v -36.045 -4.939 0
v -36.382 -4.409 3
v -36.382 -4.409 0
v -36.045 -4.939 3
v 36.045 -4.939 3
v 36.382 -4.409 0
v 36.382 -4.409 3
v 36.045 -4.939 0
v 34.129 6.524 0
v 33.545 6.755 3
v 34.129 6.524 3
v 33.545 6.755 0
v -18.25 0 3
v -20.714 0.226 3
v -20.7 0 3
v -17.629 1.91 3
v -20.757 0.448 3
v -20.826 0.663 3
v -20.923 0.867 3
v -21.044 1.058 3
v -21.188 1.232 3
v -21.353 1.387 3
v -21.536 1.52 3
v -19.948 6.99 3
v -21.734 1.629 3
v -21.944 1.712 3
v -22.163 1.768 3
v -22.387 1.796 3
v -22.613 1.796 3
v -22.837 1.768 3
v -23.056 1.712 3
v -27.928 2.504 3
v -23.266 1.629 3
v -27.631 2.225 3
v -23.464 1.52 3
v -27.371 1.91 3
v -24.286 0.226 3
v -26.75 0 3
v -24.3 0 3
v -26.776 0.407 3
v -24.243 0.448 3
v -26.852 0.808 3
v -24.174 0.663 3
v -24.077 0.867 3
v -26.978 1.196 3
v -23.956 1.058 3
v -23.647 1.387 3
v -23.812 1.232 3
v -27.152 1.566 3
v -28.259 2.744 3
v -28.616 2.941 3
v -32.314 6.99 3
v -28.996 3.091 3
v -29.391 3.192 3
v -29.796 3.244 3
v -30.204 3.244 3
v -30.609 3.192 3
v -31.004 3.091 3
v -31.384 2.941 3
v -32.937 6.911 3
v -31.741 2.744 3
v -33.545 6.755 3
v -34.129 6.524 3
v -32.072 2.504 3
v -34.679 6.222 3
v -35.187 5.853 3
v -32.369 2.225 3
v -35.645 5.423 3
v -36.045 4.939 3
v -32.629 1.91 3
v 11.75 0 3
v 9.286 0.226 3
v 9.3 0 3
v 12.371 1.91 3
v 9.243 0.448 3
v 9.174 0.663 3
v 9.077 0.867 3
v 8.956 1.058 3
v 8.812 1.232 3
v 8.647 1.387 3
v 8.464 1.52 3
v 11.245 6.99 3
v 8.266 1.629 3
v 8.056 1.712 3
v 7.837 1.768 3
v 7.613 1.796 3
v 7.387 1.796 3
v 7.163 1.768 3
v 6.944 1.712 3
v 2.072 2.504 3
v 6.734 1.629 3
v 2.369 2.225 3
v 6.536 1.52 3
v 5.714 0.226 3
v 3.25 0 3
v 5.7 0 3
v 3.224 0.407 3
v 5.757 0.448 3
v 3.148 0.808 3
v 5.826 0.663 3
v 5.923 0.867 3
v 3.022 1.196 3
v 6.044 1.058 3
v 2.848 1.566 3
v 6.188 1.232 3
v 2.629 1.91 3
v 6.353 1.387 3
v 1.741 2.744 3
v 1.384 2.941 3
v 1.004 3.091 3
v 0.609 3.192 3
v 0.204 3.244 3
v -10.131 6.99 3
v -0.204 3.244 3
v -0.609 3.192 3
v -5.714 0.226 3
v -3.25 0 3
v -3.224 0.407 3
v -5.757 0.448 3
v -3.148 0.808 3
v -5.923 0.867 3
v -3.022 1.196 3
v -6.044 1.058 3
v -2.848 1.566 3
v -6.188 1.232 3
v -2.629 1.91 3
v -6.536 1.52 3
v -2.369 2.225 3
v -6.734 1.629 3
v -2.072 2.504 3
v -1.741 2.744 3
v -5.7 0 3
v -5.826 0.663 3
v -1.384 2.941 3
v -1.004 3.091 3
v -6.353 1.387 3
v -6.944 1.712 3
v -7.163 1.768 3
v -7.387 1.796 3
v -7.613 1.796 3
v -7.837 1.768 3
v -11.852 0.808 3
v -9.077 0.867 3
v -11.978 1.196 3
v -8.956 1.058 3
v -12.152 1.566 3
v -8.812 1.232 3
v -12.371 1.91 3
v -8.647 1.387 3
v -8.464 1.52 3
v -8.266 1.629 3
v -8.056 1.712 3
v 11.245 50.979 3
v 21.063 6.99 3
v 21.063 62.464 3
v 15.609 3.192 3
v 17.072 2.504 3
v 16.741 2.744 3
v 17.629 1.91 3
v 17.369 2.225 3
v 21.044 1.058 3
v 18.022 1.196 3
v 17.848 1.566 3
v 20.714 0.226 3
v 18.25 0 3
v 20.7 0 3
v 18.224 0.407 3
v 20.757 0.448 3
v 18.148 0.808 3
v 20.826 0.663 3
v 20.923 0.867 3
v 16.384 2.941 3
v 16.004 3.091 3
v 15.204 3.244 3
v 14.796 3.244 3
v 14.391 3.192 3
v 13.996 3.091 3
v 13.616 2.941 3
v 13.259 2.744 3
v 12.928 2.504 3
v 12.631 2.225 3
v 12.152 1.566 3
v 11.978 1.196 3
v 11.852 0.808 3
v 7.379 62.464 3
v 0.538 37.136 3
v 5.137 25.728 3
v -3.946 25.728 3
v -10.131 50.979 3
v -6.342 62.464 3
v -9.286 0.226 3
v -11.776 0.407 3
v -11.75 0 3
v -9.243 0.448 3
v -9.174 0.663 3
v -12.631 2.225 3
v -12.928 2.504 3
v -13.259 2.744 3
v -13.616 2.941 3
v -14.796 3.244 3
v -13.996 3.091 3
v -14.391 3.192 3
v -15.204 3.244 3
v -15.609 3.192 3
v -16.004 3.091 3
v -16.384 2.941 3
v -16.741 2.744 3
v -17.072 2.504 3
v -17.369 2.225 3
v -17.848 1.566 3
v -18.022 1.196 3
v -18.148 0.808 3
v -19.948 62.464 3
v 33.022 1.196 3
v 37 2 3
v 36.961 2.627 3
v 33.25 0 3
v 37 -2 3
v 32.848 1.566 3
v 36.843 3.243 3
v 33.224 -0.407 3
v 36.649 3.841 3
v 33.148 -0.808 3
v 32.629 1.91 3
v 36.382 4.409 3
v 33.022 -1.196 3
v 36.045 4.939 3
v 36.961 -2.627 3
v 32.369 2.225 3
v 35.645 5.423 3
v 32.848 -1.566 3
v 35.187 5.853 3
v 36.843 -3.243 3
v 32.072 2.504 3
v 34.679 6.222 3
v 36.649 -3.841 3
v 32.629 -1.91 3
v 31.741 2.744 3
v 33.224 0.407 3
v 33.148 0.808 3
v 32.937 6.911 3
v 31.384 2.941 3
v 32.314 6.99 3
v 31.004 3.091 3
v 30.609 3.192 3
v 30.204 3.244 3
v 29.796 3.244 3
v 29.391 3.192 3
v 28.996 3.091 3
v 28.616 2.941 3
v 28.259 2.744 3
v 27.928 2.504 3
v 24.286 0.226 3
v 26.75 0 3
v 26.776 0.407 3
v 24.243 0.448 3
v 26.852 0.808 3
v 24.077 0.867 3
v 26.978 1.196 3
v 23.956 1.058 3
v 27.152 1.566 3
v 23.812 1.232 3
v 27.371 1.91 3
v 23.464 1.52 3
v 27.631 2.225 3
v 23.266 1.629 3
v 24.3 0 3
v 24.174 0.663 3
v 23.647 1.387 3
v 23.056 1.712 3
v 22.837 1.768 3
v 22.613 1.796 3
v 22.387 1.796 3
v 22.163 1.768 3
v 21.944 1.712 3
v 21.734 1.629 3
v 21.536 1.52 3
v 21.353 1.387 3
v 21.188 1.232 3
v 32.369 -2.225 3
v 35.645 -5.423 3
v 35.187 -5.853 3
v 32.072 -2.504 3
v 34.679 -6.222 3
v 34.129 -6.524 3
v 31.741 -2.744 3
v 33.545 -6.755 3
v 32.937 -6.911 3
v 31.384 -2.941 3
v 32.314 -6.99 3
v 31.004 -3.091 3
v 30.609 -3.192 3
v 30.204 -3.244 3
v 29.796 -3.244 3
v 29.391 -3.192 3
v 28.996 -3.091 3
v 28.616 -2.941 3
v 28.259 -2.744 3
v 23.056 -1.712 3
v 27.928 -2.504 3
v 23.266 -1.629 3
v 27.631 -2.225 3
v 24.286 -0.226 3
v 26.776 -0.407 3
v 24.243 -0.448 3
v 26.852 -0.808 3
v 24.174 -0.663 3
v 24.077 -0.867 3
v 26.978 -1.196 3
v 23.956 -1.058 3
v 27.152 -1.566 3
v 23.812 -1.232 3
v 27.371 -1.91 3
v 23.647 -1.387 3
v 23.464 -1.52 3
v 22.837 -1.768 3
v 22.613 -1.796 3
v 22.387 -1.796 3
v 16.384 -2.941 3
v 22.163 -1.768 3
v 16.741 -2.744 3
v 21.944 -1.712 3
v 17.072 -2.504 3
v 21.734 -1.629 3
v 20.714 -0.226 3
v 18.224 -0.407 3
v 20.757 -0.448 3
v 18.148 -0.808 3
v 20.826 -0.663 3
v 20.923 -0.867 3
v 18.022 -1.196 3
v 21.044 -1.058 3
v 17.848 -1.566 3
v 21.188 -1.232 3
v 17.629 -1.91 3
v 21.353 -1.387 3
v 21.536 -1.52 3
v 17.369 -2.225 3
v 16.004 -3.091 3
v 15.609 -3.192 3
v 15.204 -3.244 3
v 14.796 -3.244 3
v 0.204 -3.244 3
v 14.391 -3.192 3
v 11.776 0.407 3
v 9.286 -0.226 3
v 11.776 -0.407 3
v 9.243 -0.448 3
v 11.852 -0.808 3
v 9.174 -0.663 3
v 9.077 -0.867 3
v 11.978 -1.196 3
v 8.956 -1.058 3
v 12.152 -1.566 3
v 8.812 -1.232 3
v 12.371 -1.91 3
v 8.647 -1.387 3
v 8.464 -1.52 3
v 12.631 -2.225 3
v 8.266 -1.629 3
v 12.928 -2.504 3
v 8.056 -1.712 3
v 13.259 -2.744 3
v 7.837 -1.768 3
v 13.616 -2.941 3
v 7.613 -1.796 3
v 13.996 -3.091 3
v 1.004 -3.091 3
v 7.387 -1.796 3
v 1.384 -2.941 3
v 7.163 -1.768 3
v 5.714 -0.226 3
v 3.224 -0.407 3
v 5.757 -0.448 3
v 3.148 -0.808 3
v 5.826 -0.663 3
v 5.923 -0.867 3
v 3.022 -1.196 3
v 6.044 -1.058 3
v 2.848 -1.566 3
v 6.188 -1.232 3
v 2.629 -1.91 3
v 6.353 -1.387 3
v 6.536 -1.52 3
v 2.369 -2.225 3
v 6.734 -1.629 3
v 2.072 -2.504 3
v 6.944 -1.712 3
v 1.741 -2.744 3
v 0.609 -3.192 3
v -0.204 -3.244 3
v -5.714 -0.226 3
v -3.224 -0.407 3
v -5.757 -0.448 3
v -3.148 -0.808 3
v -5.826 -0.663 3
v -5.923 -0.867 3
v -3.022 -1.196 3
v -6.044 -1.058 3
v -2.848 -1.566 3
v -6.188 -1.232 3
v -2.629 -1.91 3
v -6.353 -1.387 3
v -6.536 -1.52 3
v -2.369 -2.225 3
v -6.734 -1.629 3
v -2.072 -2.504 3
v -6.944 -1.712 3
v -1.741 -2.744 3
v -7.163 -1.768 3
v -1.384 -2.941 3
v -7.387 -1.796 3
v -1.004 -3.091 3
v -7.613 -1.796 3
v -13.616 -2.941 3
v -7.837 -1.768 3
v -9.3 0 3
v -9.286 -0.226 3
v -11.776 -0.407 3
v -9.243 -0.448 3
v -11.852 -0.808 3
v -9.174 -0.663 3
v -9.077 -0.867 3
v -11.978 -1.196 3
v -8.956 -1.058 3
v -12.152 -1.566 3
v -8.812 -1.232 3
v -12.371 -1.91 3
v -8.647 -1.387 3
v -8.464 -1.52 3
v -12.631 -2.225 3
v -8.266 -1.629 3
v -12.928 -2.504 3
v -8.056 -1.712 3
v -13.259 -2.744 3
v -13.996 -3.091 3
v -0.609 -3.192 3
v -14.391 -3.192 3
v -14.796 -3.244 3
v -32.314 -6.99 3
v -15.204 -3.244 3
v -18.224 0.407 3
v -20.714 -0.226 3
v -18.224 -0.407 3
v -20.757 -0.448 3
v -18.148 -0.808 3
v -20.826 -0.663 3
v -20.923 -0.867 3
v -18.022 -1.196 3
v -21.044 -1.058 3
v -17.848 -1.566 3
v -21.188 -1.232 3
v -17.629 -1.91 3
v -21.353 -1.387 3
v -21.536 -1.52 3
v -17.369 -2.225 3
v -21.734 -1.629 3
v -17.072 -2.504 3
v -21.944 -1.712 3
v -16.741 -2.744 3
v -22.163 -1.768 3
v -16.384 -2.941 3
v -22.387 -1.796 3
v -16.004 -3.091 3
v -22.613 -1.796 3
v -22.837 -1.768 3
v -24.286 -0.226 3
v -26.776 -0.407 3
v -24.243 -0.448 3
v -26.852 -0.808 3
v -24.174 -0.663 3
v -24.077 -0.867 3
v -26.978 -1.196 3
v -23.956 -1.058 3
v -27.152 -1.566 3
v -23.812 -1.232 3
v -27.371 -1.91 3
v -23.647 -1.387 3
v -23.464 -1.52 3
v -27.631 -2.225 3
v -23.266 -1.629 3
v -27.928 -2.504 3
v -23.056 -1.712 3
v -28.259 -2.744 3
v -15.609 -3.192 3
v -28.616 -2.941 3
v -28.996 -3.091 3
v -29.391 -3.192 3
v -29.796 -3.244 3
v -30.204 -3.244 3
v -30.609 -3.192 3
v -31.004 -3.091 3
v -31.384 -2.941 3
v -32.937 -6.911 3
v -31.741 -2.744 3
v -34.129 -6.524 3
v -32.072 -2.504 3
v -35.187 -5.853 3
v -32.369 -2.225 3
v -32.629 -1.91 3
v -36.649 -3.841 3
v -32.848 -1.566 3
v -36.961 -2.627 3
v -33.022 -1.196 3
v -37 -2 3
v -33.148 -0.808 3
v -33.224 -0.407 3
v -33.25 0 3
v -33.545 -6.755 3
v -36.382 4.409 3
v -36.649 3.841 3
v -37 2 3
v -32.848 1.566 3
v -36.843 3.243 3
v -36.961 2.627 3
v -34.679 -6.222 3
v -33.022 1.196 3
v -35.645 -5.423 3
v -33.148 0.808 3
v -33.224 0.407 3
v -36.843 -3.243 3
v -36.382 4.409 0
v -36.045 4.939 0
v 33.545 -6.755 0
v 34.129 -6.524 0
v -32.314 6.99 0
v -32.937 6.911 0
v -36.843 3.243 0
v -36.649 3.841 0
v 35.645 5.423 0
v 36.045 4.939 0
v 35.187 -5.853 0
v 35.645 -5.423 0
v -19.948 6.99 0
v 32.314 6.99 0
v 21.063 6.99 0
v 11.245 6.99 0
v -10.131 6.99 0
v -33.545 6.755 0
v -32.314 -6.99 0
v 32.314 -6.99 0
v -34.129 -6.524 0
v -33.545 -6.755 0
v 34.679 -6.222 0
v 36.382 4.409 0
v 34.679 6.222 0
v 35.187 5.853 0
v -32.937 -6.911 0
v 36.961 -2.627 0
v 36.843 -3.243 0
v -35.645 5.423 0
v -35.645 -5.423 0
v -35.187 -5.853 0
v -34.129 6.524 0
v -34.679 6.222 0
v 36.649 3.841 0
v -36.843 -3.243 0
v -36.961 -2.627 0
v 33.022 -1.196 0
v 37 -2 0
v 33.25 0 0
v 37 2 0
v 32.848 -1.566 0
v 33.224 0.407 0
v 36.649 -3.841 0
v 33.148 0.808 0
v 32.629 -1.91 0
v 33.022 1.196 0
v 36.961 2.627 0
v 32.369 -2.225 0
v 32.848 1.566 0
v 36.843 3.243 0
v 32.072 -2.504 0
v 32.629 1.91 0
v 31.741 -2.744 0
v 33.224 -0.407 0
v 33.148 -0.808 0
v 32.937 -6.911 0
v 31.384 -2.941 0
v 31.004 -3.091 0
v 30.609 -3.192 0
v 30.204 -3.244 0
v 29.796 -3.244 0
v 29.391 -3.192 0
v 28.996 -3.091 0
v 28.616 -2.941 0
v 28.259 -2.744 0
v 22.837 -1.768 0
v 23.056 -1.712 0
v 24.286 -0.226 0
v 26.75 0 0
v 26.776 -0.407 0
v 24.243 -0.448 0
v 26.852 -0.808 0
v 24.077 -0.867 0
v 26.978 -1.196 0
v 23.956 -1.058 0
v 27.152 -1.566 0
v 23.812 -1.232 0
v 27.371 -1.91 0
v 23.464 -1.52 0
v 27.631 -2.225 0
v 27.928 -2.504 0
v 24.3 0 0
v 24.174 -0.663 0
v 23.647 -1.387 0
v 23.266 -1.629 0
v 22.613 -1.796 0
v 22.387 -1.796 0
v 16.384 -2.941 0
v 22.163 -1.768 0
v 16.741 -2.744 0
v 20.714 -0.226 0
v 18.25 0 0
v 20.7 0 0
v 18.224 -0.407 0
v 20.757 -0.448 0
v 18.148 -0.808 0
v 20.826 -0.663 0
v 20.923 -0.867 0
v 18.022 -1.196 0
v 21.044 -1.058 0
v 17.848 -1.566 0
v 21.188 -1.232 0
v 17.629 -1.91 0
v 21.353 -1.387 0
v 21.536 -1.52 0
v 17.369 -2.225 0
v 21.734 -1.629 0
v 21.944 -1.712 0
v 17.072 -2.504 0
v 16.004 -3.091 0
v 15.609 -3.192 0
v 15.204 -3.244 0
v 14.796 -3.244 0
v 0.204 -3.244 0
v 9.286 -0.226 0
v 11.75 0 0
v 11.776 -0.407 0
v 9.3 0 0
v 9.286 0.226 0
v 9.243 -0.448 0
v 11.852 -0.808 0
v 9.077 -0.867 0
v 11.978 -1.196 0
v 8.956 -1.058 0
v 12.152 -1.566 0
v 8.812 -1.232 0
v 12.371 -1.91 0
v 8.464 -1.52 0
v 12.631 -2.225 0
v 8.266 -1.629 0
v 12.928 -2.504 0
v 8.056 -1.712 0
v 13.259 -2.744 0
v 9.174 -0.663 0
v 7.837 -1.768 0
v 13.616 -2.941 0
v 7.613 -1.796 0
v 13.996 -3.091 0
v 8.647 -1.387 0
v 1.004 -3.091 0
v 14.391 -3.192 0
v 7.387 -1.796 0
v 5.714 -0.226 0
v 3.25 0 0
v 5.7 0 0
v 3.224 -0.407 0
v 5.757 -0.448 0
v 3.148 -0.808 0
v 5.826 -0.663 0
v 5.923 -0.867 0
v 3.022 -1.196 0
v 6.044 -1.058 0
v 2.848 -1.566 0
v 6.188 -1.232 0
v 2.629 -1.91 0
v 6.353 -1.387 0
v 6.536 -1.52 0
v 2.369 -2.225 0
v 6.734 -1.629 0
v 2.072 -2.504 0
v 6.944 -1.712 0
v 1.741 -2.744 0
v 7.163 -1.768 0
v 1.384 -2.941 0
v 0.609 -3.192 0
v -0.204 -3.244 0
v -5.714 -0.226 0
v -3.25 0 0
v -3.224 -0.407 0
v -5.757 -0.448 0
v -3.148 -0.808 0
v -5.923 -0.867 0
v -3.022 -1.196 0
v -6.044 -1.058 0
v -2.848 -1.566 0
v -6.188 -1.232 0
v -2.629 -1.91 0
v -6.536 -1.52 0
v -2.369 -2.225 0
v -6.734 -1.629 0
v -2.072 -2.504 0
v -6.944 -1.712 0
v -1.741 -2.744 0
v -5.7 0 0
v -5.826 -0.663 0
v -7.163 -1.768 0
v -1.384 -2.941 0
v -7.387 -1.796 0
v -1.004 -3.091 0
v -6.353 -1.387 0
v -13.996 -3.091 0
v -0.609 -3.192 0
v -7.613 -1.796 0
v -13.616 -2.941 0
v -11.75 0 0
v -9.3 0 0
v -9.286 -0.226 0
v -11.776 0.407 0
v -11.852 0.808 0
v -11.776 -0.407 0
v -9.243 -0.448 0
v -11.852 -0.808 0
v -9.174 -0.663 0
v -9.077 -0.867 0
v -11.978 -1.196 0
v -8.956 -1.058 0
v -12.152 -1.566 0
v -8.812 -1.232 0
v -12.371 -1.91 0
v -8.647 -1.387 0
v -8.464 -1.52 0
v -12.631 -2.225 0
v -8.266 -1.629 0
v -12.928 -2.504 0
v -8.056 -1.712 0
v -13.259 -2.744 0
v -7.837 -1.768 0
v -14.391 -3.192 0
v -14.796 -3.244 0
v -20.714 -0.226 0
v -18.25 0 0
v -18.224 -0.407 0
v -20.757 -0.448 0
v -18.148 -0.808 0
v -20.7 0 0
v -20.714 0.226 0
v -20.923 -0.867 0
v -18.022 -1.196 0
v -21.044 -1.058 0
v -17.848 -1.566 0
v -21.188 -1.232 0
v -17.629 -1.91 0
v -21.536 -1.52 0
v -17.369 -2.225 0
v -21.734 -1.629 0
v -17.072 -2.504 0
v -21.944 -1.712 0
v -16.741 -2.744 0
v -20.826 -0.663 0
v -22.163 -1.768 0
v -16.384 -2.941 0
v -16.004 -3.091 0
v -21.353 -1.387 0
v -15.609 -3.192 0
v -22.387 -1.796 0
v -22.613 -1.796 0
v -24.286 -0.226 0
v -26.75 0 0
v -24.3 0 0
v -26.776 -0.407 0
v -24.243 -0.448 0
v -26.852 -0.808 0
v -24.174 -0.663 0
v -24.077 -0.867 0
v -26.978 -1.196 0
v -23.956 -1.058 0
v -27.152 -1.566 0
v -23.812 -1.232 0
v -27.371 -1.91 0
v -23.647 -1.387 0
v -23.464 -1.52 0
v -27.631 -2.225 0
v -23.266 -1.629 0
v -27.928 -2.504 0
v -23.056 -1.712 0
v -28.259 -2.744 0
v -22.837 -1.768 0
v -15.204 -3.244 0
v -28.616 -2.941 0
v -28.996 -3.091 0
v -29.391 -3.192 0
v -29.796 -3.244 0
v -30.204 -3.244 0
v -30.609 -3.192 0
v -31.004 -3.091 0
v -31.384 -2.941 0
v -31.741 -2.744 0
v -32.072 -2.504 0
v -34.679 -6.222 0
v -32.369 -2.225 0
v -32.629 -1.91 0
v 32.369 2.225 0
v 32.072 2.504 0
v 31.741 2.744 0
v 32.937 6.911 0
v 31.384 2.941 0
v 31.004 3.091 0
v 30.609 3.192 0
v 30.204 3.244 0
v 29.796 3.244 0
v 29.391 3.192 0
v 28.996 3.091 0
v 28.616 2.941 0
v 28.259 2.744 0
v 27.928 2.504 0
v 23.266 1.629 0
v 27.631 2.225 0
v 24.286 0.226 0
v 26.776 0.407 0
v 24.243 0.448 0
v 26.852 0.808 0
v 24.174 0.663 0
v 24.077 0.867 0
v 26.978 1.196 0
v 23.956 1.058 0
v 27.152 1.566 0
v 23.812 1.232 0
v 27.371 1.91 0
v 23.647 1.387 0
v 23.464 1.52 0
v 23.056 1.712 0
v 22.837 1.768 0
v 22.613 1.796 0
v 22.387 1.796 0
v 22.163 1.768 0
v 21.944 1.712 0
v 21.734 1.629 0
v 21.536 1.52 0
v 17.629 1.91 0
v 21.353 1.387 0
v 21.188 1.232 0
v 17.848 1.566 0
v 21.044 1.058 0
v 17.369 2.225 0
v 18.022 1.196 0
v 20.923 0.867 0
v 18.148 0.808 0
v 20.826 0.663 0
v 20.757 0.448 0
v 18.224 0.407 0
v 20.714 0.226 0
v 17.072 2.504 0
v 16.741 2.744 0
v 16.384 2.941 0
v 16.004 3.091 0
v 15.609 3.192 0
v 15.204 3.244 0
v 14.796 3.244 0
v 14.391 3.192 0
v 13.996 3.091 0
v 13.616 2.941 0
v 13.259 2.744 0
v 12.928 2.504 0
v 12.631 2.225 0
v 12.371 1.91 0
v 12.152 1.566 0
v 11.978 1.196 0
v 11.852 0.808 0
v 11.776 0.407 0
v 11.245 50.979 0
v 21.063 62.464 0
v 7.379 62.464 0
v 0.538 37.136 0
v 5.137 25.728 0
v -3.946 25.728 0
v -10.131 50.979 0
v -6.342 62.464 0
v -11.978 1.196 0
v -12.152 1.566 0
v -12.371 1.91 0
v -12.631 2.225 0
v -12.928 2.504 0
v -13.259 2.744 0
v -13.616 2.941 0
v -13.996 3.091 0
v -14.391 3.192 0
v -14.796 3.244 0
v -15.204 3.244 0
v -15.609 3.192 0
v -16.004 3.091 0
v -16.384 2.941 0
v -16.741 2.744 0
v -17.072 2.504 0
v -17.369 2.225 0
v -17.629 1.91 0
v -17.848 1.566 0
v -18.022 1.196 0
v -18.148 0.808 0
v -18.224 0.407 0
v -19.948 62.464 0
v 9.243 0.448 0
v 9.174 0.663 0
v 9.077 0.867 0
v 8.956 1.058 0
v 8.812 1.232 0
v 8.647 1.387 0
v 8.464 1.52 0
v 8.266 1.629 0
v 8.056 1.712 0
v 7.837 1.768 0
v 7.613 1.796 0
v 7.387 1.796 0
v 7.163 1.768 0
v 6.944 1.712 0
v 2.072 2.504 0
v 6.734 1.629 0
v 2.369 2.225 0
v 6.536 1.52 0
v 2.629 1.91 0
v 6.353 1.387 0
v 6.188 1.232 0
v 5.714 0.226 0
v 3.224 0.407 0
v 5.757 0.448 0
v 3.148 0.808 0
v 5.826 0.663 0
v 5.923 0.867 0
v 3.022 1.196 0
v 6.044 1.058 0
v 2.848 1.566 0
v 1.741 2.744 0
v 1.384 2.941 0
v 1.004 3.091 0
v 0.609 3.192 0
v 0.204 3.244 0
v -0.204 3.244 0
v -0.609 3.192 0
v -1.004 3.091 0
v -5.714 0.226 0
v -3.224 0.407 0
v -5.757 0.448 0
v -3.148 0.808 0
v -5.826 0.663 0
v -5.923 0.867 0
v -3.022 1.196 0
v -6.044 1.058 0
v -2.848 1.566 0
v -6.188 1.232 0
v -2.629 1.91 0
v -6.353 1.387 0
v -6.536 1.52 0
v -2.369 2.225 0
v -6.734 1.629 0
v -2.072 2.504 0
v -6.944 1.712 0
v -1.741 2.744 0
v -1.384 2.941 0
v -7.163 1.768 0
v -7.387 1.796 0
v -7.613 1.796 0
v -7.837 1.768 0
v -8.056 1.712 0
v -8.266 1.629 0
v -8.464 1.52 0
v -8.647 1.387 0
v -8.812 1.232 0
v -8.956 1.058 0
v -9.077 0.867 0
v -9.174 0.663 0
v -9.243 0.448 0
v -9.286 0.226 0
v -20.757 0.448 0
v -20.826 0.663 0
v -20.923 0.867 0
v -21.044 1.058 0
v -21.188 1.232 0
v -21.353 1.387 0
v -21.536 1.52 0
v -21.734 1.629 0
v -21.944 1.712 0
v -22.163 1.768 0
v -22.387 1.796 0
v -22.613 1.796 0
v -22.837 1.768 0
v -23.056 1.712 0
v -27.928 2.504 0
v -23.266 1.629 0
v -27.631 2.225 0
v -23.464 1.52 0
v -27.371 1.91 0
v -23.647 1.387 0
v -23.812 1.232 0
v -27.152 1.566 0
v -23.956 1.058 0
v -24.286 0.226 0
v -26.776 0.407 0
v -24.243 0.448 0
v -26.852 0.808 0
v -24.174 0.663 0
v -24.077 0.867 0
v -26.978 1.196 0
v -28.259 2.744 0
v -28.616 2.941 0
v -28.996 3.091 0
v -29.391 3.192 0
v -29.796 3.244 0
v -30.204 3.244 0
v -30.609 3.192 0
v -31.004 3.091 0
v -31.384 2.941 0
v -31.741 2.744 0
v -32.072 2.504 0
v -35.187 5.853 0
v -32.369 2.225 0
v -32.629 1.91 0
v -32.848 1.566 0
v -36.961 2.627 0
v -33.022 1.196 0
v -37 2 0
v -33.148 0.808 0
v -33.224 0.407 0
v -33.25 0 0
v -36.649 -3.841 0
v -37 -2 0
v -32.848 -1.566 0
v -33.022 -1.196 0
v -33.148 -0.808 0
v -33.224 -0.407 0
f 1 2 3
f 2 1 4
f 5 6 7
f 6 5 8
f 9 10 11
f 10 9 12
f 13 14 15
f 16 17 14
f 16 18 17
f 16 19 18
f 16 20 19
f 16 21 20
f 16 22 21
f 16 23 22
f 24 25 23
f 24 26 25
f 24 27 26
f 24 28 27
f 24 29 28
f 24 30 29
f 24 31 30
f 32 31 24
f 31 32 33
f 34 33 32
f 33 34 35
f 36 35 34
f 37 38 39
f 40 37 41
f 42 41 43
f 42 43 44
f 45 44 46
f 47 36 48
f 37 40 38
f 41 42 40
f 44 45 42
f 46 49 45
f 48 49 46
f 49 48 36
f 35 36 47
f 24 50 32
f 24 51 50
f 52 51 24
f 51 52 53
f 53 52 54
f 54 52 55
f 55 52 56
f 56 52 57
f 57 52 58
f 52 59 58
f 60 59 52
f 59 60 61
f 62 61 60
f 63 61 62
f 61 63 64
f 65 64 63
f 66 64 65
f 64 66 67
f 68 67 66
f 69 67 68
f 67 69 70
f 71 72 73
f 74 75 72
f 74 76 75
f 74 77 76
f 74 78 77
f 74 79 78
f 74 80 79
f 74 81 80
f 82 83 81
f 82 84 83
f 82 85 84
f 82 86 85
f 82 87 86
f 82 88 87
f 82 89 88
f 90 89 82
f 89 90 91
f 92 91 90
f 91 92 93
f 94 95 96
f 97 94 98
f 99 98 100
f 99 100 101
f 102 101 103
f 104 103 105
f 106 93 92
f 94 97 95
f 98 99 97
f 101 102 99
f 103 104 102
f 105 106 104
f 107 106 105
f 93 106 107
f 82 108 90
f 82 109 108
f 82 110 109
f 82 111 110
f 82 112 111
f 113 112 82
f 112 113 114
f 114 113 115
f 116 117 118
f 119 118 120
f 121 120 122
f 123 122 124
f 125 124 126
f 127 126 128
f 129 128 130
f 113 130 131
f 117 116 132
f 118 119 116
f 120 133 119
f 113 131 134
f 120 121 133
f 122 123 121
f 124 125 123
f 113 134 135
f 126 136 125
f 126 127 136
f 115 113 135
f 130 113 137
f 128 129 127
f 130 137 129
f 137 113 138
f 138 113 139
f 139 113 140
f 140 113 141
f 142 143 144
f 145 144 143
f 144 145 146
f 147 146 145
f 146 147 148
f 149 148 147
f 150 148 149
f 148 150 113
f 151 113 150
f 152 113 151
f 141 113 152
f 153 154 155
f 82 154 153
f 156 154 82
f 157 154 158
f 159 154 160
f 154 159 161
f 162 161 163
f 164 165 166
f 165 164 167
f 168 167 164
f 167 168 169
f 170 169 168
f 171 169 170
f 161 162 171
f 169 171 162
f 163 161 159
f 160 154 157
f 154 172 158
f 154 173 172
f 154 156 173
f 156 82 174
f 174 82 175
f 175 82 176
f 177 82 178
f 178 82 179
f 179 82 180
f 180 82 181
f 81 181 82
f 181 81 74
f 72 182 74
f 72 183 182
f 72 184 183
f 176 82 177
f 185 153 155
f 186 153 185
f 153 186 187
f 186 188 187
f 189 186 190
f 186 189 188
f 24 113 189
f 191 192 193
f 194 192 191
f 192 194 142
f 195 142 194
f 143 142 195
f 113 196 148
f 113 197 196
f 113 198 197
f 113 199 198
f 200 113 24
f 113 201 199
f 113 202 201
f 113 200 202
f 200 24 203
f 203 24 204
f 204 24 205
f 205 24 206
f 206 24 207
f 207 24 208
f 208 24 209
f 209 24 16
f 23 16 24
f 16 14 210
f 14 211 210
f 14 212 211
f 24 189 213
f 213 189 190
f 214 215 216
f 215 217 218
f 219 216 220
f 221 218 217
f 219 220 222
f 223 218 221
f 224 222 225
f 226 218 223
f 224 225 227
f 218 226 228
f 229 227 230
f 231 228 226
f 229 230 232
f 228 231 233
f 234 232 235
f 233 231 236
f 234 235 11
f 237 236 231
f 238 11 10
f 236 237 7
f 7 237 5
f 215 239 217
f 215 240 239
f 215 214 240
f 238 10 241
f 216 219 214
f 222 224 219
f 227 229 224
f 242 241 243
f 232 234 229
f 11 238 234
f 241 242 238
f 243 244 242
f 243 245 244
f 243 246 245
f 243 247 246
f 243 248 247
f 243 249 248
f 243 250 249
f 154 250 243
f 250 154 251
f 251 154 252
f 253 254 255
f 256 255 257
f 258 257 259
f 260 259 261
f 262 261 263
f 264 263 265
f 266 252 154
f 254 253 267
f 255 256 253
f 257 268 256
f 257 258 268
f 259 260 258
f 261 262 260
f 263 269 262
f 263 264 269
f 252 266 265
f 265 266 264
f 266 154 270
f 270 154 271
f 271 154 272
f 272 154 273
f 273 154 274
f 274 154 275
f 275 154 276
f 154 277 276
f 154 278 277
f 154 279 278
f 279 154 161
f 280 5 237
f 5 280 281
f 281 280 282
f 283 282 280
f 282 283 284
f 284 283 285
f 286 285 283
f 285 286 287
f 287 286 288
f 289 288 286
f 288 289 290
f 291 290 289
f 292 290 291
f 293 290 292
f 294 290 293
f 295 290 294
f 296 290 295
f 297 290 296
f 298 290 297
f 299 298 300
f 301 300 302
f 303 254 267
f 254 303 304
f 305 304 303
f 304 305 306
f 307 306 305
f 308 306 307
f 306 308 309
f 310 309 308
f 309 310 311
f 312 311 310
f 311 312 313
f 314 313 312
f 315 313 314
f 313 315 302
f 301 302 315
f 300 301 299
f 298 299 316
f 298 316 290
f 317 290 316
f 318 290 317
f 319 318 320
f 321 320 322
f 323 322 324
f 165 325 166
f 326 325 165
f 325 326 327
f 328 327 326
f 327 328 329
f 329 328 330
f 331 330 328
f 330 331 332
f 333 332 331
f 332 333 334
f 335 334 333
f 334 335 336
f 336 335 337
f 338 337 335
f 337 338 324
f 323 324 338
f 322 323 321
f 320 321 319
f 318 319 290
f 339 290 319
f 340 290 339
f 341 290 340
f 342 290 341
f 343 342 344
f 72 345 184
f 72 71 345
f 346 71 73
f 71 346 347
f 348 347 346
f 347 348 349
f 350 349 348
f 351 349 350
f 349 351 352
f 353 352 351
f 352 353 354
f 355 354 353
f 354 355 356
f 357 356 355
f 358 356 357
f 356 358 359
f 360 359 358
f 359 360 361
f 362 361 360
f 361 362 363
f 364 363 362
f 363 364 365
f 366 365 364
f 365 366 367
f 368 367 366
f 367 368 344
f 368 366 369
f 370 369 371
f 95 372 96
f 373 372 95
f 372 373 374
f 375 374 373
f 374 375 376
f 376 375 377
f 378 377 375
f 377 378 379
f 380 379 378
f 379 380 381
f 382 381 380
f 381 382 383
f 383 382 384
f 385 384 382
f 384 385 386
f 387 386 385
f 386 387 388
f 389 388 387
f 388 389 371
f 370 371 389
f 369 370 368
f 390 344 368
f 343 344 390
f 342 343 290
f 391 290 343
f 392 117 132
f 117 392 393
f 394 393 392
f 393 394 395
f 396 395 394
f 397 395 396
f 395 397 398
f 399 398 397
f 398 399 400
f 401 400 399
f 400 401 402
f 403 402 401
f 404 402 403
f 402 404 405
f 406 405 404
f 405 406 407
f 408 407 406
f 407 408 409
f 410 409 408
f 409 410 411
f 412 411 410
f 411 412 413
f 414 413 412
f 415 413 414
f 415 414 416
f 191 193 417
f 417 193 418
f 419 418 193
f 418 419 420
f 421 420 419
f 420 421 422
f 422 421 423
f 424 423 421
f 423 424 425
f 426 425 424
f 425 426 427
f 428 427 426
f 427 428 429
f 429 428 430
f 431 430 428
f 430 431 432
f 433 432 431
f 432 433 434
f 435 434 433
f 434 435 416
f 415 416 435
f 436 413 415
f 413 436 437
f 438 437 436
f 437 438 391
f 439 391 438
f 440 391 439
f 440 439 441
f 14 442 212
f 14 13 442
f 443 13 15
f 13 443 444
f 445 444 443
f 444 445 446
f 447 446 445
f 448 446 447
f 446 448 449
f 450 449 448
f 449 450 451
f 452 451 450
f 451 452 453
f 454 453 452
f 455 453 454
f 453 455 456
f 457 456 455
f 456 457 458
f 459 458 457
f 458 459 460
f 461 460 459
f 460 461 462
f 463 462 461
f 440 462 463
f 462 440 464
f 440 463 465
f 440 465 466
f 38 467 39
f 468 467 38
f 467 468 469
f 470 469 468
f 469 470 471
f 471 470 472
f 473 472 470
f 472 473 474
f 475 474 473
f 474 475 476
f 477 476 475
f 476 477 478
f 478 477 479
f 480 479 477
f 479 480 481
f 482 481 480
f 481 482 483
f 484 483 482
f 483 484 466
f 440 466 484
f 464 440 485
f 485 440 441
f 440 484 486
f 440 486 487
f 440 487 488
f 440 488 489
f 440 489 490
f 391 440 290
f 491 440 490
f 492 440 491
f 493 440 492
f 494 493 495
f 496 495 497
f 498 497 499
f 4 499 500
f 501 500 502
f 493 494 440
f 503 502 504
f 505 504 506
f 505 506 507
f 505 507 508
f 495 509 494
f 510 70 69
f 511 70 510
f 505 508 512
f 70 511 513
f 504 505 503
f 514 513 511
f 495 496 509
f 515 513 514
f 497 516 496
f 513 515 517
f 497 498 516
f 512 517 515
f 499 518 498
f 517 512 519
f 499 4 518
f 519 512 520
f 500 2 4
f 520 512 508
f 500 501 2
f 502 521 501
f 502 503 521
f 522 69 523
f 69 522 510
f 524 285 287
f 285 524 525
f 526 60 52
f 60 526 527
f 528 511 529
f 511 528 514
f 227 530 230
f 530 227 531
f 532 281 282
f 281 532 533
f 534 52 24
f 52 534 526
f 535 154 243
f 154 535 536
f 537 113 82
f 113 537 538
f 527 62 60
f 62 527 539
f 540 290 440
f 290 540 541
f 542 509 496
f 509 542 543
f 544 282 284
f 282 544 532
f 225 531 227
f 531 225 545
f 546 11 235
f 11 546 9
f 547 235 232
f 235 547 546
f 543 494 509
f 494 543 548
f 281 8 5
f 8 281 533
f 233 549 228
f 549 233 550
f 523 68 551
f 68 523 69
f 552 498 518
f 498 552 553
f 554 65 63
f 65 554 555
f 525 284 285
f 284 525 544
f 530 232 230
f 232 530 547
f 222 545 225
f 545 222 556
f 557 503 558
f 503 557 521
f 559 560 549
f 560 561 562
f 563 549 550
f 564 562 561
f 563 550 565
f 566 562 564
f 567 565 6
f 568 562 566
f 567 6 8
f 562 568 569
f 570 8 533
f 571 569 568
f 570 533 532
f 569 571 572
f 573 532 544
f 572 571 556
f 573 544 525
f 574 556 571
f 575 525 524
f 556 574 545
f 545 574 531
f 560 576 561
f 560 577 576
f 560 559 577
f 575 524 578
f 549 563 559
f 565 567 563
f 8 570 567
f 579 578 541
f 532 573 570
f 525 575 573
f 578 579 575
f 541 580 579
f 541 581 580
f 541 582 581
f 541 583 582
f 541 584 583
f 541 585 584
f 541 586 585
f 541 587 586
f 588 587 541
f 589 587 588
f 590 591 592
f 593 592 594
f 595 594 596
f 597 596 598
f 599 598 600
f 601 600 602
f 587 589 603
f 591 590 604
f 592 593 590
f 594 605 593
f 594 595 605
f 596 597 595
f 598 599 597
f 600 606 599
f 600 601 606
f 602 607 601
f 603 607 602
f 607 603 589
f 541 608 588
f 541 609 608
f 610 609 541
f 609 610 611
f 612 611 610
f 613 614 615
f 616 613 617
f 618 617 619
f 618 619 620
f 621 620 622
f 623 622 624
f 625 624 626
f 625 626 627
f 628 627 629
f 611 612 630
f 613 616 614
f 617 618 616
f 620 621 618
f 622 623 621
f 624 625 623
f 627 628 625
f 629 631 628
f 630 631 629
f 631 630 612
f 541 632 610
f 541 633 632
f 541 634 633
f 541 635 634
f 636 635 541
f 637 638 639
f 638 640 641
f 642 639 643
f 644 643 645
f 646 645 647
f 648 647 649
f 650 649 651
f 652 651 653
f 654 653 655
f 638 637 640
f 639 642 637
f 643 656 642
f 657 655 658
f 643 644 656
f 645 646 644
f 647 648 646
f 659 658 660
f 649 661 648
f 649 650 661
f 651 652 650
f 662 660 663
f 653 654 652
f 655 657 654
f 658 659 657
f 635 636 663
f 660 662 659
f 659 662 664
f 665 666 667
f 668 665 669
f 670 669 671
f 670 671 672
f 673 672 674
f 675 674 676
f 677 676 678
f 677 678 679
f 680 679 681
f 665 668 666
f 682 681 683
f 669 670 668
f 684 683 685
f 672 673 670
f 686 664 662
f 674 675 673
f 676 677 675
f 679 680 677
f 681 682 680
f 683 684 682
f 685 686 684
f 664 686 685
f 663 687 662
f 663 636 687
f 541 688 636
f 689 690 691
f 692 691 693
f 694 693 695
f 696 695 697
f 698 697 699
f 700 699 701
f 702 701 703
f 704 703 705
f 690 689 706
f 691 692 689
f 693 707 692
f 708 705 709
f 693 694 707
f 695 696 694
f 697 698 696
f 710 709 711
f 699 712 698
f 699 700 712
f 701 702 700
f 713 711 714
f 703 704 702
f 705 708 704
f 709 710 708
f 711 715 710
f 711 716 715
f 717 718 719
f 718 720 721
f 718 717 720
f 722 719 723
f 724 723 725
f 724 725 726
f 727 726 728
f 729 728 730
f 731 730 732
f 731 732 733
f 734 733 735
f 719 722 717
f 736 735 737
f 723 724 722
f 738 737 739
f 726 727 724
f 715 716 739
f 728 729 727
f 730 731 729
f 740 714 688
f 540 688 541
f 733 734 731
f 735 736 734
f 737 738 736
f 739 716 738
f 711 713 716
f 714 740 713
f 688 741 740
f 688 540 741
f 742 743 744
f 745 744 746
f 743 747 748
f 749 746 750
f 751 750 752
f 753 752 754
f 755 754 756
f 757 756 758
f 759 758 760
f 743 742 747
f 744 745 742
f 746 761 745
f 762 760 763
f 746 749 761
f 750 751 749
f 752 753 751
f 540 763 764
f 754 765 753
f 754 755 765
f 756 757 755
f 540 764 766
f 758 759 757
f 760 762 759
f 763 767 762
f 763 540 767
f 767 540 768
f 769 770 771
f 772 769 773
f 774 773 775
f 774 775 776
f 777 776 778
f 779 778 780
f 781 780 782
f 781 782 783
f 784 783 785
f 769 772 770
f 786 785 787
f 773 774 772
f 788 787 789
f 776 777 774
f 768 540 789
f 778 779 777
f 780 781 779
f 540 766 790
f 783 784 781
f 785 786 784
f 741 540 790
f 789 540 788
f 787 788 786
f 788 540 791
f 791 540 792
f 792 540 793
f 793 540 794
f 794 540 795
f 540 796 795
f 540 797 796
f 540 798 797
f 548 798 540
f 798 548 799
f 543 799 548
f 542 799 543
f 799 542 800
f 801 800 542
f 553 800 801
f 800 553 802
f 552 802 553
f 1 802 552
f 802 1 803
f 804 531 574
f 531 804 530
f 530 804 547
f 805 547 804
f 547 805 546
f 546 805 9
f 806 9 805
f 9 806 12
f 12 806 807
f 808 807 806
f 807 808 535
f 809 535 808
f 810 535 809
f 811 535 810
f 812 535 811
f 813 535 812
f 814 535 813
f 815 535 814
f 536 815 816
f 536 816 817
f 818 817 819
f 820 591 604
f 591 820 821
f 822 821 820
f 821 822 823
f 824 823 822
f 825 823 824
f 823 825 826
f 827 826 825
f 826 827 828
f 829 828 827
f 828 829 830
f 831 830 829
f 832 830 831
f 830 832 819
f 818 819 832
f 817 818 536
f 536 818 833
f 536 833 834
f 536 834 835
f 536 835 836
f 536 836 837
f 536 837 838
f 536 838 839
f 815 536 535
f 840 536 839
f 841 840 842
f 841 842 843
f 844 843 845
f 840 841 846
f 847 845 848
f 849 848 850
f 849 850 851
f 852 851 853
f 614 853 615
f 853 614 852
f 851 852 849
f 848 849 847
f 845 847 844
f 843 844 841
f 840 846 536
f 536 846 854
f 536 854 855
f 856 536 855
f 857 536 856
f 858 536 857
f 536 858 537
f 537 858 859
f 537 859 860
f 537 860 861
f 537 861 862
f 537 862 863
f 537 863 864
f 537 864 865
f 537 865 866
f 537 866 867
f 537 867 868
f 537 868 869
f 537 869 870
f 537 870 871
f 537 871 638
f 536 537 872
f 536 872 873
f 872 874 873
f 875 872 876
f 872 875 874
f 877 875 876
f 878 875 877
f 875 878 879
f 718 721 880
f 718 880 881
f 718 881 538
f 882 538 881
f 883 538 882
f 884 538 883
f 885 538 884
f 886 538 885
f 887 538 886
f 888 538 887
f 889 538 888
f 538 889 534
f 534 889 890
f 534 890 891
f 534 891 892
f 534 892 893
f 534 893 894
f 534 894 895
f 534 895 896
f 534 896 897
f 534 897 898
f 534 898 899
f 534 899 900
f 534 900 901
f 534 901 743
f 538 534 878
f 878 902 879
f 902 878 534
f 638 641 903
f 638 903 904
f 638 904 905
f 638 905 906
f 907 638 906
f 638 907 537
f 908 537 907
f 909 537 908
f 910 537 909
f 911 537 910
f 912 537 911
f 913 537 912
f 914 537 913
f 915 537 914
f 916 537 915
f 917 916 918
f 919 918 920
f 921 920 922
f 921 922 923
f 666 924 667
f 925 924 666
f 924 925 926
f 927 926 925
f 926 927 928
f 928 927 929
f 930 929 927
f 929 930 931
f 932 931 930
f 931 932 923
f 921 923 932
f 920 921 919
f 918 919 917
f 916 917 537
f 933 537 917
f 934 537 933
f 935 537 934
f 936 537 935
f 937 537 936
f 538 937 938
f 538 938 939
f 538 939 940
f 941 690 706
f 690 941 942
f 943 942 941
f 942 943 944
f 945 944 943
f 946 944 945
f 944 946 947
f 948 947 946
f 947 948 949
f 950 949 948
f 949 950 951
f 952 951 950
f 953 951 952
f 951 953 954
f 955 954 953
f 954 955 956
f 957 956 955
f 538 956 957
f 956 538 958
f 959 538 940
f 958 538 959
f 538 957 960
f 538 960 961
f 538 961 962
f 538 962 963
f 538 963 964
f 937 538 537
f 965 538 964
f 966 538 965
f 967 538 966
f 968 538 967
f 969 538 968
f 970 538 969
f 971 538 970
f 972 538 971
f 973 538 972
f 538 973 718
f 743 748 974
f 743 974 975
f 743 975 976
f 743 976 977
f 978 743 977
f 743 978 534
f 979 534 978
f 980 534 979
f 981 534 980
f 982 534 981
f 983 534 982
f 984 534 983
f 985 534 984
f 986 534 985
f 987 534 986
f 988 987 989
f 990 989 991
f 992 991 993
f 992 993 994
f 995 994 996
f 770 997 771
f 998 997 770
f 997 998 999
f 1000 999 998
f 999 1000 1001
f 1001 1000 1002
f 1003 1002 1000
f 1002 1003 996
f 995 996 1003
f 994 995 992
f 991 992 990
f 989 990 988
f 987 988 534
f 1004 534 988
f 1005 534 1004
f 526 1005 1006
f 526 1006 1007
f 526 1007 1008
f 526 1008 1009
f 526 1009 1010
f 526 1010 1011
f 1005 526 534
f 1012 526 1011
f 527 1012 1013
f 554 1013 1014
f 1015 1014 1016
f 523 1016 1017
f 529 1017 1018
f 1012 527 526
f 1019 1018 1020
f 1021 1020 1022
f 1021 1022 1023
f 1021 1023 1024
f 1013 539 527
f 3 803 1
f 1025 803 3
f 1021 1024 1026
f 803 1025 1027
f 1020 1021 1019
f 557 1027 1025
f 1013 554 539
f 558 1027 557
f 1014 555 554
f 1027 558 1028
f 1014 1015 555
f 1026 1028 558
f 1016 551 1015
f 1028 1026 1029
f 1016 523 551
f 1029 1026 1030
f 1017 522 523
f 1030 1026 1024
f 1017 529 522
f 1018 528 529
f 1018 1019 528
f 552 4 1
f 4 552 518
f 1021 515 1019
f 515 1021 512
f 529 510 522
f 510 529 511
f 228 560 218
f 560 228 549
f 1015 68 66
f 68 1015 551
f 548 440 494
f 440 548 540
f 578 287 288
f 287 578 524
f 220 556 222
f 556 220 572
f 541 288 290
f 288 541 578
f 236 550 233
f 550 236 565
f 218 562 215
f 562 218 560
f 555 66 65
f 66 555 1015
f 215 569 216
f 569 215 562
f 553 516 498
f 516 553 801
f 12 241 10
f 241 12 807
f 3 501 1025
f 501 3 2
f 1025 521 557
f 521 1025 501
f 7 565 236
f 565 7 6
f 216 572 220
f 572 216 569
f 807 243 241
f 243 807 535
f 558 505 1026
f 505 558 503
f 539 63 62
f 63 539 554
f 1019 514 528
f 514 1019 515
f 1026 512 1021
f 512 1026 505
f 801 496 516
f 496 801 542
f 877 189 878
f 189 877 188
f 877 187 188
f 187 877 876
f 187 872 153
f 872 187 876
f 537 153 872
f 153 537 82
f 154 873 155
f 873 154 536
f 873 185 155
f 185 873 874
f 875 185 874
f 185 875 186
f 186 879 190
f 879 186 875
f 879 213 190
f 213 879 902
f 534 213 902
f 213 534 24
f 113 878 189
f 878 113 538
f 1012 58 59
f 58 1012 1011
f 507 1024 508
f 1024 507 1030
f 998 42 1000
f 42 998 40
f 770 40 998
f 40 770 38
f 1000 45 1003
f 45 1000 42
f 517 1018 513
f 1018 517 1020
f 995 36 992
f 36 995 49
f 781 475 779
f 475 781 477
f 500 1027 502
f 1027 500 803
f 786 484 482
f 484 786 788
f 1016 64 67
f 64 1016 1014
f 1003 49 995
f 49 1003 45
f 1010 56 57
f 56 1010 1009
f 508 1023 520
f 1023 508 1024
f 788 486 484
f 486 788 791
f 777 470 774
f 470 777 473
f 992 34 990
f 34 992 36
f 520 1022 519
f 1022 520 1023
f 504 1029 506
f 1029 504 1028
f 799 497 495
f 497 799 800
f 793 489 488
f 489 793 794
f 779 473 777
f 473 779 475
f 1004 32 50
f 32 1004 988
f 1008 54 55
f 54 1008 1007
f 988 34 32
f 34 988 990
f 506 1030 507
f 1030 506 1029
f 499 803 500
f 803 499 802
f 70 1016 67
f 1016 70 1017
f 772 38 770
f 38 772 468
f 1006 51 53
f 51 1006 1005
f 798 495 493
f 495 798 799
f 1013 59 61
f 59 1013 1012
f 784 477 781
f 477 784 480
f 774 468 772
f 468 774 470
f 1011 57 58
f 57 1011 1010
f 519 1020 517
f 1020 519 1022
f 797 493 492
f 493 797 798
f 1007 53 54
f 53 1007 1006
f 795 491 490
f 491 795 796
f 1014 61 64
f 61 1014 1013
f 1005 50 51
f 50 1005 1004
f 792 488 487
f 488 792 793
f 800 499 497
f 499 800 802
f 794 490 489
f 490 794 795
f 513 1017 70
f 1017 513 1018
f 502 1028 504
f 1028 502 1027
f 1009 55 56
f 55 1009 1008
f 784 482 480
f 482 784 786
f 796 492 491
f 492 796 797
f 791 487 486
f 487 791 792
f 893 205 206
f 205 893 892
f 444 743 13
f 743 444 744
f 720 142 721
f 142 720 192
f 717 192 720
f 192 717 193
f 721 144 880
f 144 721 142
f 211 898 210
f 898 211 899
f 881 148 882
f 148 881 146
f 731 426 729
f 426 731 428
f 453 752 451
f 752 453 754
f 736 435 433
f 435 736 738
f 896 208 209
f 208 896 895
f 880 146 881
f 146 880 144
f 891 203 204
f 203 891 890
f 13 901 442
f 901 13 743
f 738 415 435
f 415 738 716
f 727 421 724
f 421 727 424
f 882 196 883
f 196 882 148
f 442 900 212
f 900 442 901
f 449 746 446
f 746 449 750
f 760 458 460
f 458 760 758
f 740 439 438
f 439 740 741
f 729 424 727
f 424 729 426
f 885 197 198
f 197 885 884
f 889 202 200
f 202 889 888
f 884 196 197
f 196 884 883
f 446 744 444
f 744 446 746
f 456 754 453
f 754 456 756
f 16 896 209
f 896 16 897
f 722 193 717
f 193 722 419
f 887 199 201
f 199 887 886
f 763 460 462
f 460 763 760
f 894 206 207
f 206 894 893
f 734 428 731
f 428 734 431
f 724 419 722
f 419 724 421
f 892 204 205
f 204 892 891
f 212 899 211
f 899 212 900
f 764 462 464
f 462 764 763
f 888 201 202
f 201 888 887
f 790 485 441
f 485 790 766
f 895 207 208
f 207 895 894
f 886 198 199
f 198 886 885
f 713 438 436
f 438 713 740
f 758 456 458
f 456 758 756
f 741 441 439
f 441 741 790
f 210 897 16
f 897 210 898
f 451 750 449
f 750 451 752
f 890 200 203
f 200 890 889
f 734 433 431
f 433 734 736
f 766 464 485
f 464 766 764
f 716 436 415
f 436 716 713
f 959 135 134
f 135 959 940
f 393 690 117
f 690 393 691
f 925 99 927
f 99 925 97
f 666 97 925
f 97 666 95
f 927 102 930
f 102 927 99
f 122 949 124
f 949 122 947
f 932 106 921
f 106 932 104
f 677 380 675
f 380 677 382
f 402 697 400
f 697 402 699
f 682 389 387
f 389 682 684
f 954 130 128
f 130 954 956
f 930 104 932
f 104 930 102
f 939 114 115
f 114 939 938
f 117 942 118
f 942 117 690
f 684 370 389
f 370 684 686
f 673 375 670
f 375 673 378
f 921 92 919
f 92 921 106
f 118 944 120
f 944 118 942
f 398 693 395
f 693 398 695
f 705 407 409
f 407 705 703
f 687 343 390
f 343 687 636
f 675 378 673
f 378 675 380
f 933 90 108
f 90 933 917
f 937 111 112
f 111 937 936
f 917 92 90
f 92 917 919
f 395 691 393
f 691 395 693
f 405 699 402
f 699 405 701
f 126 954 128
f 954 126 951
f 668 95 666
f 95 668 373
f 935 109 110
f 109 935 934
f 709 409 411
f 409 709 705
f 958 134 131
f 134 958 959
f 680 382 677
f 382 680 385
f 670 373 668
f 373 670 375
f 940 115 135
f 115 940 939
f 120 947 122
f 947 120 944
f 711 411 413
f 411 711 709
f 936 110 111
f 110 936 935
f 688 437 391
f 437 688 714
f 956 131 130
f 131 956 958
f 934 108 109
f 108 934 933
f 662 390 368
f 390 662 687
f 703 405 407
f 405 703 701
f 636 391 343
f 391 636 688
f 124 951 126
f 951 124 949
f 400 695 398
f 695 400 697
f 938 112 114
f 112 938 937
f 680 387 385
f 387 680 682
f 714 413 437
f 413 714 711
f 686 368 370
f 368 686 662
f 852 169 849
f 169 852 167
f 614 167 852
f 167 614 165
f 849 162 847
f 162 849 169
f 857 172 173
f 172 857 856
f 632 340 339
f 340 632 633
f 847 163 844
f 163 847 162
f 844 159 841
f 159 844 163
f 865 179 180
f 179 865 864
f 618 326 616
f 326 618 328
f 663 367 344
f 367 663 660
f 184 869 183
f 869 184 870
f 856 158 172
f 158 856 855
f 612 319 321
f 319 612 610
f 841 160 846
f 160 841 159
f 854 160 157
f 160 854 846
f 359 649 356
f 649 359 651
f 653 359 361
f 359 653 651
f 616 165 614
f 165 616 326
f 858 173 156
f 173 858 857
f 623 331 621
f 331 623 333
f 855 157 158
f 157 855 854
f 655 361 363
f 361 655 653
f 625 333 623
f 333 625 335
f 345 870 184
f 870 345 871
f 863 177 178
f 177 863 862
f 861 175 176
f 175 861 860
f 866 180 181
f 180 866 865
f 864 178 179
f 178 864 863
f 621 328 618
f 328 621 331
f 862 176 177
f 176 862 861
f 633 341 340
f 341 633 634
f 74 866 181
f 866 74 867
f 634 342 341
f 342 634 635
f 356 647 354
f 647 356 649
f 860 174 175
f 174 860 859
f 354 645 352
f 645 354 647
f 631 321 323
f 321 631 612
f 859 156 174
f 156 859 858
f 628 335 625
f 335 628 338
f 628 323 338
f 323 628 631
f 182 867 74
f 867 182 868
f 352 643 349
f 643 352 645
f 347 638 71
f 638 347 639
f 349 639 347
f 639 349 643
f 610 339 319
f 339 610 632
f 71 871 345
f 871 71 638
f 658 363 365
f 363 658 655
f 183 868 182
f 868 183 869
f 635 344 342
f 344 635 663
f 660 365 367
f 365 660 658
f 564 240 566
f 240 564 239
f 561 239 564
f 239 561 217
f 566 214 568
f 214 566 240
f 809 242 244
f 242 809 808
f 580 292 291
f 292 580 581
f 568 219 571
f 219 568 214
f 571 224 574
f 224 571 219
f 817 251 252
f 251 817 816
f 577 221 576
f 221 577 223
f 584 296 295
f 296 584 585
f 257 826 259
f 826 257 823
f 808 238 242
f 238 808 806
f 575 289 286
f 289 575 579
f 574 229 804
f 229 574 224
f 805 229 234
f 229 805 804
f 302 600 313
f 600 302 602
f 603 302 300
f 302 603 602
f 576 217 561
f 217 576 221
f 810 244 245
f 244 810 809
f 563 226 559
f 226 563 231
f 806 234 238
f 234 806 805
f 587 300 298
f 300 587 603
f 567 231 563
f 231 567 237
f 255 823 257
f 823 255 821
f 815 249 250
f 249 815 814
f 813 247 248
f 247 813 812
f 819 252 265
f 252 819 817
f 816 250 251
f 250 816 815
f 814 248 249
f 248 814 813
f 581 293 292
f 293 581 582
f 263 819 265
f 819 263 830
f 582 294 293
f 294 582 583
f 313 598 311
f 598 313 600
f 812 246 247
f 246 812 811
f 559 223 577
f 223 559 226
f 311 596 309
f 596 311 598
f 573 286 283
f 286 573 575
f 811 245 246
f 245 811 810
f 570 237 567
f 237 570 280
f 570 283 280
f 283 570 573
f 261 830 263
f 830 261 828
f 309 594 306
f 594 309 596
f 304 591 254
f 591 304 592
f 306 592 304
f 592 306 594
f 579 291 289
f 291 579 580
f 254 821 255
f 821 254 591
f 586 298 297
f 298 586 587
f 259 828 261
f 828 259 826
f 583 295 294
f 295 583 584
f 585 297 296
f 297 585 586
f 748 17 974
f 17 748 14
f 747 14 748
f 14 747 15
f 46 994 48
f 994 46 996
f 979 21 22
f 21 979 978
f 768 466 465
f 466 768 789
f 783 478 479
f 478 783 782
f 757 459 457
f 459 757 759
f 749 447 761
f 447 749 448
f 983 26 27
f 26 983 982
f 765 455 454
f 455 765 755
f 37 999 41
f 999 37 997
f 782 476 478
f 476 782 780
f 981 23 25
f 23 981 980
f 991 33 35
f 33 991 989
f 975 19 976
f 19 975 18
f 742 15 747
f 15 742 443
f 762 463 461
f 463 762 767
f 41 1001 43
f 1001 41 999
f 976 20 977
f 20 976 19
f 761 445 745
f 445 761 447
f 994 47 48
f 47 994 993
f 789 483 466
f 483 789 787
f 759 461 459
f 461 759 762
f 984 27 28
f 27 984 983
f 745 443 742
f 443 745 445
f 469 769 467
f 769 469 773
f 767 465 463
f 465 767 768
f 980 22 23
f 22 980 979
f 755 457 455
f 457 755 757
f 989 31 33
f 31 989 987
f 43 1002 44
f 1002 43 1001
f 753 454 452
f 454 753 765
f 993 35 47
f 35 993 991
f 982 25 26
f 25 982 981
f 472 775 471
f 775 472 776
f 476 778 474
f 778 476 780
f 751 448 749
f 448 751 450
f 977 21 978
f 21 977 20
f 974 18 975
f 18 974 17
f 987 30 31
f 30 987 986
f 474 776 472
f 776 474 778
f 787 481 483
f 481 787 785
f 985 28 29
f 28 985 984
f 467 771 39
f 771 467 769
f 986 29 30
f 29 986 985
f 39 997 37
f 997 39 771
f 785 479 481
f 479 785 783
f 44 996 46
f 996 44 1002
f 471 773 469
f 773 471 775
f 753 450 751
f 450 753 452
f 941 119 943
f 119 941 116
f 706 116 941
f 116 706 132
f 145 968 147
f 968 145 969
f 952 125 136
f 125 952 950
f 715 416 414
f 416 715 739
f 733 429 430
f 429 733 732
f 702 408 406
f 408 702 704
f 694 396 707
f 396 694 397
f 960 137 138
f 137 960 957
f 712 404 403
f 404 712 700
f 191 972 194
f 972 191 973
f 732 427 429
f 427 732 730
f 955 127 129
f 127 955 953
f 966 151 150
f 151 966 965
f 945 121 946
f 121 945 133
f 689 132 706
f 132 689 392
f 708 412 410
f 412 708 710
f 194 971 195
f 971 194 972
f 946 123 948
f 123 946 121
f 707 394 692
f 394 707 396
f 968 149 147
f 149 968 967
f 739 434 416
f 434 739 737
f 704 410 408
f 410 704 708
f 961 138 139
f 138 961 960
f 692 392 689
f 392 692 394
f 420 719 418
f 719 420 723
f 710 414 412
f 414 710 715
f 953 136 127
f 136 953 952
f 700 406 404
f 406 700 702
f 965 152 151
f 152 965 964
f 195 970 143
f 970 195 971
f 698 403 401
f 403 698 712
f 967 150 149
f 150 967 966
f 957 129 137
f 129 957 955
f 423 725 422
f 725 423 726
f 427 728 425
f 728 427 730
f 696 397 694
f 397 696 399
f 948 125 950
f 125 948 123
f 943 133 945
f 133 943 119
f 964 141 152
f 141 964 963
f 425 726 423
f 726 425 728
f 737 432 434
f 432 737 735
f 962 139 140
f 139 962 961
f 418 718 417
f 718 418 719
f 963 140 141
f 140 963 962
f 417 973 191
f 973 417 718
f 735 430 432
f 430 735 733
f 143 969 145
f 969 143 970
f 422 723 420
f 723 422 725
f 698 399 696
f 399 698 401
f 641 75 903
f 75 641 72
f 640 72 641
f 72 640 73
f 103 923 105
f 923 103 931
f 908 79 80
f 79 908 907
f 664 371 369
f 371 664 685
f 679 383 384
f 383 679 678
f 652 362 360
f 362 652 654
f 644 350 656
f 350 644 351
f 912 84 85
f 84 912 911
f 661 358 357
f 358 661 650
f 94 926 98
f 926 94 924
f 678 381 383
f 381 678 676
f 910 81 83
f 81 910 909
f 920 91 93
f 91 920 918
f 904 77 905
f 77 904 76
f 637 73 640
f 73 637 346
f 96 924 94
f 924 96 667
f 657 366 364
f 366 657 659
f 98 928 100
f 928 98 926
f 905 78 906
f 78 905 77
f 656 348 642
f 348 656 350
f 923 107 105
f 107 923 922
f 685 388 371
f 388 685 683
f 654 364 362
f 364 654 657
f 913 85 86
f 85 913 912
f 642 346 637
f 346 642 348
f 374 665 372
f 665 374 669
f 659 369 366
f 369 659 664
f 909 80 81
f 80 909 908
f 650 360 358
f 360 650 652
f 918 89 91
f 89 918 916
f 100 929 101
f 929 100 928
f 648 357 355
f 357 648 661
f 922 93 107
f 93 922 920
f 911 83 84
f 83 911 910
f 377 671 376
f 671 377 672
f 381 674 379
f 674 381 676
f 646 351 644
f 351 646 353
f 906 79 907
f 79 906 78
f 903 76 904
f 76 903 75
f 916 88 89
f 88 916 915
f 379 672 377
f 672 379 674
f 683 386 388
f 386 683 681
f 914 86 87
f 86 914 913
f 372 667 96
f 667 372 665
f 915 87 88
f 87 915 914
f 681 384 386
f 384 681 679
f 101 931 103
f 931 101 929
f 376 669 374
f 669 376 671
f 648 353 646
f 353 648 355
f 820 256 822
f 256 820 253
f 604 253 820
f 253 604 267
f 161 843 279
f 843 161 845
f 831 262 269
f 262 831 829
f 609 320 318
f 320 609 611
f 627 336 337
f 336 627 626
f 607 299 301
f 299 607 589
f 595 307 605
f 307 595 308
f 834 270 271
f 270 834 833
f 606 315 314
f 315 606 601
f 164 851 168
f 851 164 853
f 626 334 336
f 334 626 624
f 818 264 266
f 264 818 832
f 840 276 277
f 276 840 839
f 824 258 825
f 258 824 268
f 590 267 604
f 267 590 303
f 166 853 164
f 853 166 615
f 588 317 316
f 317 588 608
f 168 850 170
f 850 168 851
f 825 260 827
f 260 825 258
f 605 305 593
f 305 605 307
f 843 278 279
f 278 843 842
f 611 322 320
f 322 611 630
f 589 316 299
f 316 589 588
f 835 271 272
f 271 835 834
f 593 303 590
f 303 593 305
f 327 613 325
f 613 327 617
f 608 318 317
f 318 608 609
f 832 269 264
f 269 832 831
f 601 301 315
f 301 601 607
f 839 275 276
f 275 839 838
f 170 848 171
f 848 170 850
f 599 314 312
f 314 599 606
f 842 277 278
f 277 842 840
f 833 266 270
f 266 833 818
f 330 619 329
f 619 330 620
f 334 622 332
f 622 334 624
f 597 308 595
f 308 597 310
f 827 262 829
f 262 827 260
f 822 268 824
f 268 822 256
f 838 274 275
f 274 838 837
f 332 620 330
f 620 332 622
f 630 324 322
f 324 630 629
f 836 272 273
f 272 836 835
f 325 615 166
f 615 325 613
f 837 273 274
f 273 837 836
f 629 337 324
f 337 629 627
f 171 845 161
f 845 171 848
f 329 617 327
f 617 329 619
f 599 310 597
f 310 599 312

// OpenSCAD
$fn = 50;


difference() {
	union() {
		hull() {
			translate(v = [-32.0000000000, 2.0000000000, 0]) {
				cylinder(h = 3, r = 5);
			}
			translate(v = [32.0000000000, 2.0000000000, 0]) {
				cylinder(h = 3, r = 5);
			}
			translate(v = [-32.0000000000, -2.0000000000, 0]) {
				cylinder(h = 3, r = 5);
			}
			translate(v = [32.0000000000, -2.0000000000, 0]) {
				cylinder(h = 3, r = 5);
			}
		}
		translate(v = [0, 61.1111111111, 0]) {
			linear_extrude(height = 3) {
				text(font = "DejaVu Sans Mono:style=Bold", halign = "center", size = 57.0000000000, text = "M", valign = "top");
			}
		}
	}
	union() {
		translate(v = [-30.0000000000, 0.0000000000, 0]) {
			translate(v = [0, 0, -100]) {
				cylinder(h = 200, r = 3.2500000000);
			}
		}
		translate(v = [-15.0000000000, 0.0000000000, 0]) {
			translate(v = [0, 0, -100]) {
				cylinder(h = 200, r = 3.2500000000);
			}
		}
		translate(v = [0, 0, -100]) {
			cylinder(h = 200, r = 3.2500000000);
		}
		translate(v = [15.0000000000, 0.0000000000, 0]) {
			translate(v = [0, 0, -100]) {
				cylinder(h = 200, r = 3.2500000000);
			}
		}
		translate(v = [30.0000000000, 0.0000000000, 0]) {
			translate(v = [0, 0, -100]) {
				cylinder(h = 200, r = 3.2500000000);
			}
		}
		translate(v = [-30.0000000000, 0.0000000000, 0]) {
			translate(v = [0, 0, -100]) {
				cylinder(h = 200, r = 1.8000000000);
			}
		}
		translate(v = [-22.5000000000, 0.0000000000, 0]) {
			translate(v = [0, 0, -100]) {
				cylinder(h = 200, r = 1.8000000000);
			}
		}
		translate(v = [-15.0000000000, 0.0000000000, 0]) {
			translate(v = [0, 0, -100]) {
				cylinder(h = 200, r = 1.8000000000);
			}
		}
		translate(v = [-7.5000000000, 0.0000000000, 0]) {
			translate(v = [0, 0, -100]) {
				cylinder(h = 200, r = 1.8000000000);
			}
		}
		translate(v = [0, 0, -100]) {
			cylinder(h = 200, r = 1.8000000000);
		}
		translate(v = [7.5000000000, 0.0000000000, 0]) {
			translate(v = [0, 0, -100]) {
				cylinder(h = 200, r = 1.8000000000);
			}
		}
		translate(v = [15.0000000000, 0.0000000000, 0]) {
			translate(v = [0, 0, -100]) {
				cylinder(h = 200, r = 1.8000000000);
			}
		}
		translate(v = [22.5000000000, 0.0000000000, 0]) {
			translate(v = [0, 0, -100]) {
				cylinder(h = 200, r = 1.8000000000);
			}
		}
		translate(v = [30.0000000000, 0.0000000000, 0]) {
			translate(v = [0, 0, -100]) {
				cylinder(h = 200, r = 1.8000000000);
			}
		}
	}
}
